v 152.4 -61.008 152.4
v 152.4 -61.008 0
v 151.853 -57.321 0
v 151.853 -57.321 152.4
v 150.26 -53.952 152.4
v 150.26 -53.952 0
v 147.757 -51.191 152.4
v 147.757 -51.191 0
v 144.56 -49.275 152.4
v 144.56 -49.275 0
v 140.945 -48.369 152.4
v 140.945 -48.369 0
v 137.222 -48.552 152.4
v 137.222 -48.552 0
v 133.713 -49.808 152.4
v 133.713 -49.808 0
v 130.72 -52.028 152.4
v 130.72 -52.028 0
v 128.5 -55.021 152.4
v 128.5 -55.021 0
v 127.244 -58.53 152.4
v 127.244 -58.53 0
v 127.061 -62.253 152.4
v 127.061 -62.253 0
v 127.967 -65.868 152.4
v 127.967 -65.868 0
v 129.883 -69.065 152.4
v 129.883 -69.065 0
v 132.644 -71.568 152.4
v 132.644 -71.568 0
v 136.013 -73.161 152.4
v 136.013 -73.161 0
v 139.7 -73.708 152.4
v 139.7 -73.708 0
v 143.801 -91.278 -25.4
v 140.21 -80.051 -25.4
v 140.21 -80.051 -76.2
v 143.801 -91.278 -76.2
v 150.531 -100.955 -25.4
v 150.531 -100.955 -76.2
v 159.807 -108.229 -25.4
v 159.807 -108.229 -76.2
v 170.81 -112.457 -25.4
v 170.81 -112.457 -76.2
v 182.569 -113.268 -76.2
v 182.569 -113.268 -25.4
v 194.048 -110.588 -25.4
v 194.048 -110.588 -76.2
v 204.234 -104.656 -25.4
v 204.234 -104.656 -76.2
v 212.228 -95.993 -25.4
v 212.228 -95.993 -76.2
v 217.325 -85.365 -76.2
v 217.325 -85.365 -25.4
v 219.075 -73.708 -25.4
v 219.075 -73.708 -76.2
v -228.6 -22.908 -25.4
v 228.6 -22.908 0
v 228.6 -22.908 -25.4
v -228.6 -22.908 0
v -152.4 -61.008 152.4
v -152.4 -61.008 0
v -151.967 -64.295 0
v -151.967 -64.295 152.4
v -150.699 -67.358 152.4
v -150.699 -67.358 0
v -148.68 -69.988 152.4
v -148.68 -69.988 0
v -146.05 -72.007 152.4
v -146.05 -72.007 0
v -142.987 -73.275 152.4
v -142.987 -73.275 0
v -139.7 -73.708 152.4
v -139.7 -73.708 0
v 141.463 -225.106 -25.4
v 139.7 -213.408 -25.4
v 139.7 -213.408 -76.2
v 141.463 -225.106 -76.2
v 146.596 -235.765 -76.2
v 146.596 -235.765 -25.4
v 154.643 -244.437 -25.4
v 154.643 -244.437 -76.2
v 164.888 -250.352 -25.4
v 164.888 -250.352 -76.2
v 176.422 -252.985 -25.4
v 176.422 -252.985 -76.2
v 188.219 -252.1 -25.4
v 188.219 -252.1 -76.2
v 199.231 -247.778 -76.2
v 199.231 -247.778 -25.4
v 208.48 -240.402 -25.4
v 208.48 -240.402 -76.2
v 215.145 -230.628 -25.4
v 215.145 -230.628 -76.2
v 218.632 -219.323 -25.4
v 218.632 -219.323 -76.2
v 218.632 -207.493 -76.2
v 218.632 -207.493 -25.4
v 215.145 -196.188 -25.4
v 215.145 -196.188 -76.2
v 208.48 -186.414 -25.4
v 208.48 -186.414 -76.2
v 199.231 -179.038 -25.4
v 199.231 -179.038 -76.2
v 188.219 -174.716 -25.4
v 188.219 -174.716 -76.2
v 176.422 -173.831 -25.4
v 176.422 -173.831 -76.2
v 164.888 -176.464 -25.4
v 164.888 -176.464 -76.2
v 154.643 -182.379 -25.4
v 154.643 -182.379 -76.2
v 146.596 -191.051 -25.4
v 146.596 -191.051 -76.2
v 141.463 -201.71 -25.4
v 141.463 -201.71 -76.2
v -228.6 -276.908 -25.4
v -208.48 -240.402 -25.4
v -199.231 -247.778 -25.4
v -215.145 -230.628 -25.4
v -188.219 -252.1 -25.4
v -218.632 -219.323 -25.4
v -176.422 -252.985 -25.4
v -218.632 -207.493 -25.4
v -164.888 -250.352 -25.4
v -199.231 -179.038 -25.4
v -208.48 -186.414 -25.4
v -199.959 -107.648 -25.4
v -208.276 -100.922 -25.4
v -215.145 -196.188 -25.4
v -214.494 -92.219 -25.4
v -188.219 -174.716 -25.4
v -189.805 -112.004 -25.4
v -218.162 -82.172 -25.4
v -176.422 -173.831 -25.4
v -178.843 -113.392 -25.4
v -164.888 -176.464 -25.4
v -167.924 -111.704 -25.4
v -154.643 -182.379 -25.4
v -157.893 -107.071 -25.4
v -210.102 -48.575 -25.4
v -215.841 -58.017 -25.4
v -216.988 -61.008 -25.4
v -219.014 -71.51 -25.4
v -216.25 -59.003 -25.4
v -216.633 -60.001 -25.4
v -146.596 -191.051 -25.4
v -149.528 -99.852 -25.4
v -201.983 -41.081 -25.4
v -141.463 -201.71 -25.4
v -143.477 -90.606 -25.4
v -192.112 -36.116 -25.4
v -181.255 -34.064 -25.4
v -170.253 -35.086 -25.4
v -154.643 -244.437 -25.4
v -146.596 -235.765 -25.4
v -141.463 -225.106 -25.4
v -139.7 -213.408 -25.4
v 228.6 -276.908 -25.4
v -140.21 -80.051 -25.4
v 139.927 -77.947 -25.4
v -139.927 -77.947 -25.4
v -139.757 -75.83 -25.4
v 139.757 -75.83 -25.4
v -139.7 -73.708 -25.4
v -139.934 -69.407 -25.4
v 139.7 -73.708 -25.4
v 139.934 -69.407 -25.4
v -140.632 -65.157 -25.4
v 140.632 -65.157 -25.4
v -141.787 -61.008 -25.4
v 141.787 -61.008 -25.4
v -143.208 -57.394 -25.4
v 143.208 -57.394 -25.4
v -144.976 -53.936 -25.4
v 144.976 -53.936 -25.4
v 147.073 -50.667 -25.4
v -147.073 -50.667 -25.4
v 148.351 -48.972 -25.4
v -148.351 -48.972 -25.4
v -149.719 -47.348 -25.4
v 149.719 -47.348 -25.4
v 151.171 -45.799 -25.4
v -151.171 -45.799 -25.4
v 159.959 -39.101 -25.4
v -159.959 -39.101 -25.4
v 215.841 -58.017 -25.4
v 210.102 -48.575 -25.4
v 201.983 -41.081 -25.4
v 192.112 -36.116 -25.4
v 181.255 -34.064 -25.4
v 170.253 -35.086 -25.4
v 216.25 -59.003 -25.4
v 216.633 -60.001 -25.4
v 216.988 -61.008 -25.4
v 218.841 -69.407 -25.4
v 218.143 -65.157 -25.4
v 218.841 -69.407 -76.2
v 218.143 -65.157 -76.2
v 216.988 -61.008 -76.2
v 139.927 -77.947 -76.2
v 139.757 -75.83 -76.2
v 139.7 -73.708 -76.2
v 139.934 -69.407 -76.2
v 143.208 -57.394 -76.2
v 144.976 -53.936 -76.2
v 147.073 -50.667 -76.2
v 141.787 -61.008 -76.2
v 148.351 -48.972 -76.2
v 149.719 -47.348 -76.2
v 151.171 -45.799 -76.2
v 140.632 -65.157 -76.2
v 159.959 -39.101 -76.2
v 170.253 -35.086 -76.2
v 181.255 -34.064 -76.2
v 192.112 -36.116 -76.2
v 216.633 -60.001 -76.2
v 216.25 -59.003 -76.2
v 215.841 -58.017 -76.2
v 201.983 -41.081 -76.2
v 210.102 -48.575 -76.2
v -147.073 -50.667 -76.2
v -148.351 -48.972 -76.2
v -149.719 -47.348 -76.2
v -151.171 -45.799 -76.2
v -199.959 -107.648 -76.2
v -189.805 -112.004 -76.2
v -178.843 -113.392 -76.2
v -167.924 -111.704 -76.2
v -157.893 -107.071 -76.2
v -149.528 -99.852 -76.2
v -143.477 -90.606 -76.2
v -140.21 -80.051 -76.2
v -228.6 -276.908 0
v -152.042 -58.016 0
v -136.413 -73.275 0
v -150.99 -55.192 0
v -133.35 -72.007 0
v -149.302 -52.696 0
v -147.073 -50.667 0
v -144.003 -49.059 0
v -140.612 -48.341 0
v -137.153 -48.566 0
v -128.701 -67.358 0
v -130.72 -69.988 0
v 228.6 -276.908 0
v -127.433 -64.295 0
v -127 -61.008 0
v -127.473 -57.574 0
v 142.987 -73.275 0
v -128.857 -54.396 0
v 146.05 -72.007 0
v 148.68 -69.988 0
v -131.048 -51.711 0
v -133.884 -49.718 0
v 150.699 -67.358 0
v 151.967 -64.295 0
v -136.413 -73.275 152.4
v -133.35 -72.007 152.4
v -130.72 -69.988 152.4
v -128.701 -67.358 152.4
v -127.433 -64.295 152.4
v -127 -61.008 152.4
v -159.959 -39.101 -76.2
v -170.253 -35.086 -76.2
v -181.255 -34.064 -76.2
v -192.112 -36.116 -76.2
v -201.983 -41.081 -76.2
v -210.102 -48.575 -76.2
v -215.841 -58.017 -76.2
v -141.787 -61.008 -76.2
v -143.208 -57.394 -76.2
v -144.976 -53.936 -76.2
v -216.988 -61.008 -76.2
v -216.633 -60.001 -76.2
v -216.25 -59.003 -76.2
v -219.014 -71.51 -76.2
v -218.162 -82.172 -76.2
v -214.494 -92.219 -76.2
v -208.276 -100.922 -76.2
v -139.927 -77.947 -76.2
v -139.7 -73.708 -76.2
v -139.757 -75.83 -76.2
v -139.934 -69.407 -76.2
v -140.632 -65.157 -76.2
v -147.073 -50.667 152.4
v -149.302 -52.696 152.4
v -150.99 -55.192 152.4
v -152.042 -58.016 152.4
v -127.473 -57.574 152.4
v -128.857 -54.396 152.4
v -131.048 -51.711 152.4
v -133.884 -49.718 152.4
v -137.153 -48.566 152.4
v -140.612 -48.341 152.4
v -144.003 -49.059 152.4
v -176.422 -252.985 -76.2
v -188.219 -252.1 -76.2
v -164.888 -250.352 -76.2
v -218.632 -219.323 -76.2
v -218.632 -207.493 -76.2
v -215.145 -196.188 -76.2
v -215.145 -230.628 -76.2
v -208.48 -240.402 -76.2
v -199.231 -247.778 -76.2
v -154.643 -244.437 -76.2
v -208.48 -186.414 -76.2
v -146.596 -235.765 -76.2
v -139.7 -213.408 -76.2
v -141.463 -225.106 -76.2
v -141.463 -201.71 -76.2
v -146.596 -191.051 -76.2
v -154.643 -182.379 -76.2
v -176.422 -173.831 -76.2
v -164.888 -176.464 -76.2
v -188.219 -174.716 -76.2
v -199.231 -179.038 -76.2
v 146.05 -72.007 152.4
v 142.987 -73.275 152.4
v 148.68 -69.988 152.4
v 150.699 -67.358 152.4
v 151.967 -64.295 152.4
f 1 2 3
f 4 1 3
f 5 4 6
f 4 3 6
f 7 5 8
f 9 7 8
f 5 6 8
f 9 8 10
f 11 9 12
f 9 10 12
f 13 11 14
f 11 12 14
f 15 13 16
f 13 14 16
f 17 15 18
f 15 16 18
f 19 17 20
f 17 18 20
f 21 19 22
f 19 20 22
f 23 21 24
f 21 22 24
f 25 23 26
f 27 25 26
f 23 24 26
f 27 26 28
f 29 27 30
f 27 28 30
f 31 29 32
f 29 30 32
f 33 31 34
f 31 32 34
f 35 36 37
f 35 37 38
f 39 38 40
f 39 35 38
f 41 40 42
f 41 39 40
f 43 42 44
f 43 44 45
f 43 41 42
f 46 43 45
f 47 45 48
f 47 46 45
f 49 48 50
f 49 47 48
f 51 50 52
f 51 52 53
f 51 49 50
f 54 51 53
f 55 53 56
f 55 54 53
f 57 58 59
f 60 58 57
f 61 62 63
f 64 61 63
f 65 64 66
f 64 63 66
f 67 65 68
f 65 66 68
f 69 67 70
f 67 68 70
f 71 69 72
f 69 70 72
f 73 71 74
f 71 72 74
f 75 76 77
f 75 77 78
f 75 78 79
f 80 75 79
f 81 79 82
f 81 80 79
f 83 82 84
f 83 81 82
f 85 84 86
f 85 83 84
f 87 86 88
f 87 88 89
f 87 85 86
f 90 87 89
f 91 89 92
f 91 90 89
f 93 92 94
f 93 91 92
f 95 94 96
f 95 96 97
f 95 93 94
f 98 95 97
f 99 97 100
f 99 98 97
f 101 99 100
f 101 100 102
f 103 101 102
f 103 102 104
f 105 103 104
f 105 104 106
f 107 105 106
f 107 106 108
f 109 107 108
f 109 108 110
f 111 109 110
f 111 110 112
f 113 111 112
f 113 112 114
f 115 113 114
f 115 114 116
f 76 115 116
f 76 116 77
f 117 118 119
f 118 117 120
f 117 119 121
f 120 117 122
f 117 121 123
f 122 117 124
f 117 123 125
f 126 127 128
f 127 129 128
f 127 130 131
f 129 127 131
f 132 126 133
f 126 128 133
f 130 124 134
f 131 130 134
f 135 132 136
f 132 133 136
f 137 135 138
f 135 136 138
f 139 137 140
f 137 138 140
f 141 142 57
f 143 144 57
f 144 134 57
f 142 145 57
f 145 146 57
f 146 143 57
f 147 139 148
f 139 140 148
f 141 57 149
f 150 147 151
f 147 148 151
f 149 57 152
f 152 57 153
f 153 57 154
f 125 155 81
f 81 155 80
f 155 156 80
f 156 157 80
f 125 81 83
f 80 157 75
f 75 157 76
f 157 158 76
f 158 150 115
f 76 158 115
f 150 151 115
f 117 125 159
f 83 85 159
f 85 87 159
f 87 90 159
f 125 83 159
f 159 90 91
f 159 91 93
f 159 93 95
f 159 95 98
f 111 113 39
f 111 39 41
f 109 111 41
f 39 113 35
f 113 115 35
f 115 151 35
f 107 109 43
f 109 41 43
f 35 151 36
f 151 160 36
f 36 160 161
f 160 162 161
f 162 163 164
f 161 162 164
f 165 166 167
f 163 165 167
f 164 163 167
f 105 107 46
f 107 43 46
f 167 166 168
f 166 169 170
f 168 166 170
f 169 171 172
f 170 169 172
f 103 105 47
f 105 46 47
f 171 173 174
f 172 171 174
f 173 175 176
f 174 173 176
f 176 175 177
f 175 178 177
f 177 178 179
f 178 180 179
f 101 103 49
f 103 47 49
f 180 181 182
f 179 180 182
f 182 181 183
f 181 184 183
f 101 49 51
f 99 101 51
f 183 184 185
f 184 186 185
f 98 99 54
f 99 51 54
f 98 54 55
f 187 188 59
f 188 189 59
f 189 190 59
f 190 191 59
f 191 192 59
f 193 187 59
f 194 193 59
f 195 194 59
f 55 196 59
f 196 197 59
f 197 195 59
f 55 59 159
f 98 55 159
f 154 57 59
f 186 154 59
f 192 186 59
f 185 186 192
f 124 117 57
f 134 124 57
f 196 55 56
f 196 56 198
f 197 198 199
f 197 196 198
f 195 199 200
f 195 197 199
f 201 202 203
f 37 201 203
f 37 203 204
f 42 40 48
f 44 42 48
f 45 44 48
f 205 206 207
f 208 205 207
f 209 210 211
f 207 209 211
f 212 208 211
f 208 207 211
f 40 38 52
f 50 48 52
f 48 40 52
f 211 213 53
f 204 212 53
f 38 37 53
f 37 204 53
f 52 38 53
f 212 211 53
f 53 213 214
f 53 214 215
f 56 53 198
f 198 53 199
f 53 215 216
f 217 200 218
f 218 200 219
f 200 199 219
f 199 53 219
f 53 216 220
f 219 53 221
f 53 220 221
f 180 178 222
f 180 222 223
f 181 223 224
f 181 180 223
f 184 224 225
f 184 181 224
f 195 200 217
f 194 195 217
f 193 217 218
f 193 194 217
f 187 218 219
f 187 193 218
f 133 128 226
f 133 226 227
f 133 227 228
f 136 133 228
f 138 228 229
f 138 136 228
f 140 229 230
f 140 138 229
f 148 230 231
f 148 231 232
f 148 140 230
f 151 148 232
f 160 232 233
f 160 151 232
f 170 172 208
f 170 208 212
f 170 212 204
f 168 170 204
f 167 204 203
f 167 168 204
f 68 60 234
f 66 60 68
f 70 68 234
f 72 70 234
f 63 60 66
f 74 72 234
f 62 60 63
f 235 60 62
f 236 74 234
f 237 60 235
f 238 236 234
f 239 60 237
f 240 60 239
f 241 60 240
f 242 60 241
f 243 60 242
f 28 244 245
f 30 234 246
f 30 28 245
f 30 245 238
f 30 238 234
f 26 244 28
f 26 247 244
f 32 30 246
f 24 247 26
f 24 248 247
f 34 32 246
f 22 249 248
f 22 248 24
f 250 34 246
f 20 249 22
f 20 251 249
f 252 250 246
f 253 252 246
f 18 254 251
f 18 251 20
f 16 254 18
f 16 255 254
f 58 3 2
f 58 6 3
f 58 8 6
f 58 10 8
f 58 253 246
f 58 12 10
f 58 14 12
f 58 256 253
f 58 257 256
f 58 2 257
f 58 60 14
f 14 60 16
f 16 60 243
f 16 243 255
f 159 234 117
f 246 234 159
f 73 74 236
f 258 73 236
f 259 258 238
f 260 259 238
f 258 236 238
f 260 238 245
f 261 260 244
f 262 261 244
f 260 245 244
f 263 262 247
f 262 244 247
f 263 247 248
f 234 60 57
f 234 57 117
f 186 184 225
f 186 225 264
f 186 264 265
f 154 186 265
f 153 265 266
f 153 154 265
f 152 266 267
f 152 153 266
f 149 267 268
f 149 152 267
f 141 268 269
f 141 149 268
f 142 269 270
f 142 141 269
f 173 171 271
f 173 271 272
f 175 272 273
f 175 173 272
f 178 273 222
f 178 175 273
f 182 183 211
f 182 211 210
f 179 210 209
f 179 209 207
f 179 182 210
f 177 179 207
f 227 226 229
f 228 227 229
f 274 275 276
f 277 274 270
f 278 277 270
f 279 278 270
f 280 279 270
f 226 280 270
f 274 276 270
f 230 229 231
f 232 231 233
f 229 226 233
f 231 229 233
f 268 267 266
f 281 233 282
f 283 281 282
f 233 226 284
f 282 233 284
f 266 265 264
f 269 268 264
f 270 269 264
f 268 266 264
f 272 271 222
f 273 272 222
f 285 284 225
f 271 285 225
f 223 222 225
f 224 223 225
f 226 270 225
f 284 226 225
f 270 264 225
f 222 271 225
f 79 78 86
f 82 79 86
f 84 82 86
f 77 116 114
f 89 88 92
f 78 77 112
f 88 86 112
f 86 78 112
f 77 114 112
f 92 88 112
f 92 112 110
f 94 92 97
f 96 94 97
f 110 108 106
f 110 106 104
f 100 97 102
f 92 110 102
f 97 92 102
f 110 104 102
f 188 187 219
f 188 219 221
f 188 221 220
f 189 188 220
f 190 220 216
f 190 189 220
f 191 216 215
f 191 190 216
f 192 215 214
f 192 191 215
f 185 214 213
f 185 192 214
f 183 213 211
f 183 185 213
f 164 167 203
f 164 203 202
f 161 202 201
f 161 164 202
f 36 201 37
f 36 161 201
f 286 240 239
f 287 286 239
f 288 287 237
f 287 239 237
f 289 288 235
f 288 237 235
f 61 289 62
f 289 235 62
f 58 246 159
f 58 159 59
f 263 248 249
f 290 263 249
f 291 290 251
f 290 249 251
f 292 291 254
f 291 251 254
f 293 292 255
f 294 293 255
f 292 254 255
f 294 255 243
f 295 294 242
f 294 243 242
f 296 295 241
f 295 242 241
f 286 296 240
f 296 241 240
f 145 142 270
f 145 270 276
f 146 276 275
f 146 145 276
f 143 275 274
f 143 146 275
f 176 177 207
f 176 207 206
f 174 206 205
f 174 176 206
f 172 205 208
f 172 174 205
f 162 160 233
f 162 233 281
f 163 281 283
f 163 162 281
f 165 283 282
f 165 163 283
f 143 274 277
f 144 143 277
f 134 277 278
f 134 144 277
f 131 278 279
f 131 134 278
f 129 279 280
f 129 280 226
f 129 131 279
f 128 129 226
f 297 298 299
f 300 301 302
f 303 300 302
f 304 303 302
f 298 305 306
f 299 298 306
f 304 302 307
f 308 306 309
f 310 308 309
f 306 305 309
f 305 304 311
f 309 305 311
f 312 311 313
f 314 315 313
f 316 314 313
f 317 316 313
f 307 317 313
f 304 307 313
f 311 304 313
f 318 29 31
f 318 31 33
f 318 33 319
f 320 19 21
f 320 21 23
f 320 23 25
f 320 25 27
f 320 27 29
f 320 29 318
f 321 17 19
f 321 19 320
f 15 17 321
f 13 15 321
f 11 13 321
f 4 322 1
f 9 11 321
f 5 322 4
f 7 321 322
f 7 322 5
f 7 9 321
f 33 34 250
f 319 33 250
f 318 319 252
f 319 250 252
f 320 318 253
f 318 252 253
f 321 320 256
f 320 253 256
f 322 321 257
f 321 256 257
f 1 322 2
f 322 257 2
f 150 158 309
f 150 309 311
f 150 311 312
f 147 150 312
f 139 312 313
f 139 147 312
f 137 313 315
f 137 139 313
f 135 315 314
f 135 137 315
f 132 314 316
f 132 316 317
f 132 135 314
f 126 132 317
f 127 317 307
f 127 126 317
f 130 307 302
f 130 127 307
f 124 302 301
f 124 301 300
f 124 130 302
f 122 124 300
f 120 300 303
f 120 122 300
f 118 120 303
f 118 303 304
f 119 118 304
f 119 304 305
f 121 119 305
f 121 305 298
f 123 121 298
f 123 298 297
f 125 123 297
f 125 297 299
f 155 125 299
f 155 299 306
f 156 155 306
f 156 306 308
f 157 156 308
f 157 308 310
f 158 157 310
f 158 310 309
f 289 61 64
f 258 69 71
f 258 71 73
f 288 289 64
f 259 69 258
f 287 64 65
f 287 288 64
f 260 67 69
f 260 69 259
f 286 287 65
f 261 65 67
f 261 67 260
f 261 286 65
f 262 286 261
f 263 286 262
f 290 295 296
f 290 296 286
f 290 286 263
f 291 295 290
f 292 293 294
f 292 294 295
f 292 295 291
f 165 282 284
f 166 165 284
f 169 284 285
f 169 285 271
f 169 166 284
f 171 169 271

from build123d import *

# Parameters (mm, degrees)
F0_R     = 39.6875
F1_DEPTH = 25.4
F2_DEPTH = 76.2
F3_DEPTH = 152.4


with BuildPart() as f1:
    # F0 (on Top) → F1 (new body)
    with BuildSketch(Plane.XY):
        with BuildLine():
            Line((64.5657867546, -73.7079969396), (0, -73.7079969396))
            Line((0, -73.7079969396), (0, -213.4079969396))
            Line((0, -213.4079969396), (0, -276.9079969396))
            Line((0, -276.9079969396), (228.6, -276.9079969396))
            Line((228.6, -276.9079969396), (228.6, -61.0079969396))
            Line((228.6, -61.0079969396), (216.9881337214, -61.0079969396))
            ThreePointArc((216.9881337214, -61.0079969396), (218.5498084551, -67.2728393878), (219.075, -73.7079969396))
            ThreePointArc((219.075, -73.7079969396), (213.9674206511, -93.1843093218), (199.9593215616, -107.6476170595))
            ThreePointArc((199.9593215616, -107.6476170595), (121.1719117521, -134.9211212537), (64.5657867546, -73.7079969396))
        make_face()
        with BuildLine():
            ThreePointArc((219.075, -213.4079969396), (179.3875, -253.0954969396), (139.7, -213.4079969396))
            ThreePointArc((139.7, -213.4079969396), (179.3875, -173.7204969396), (219.075, -213.4079969396))
        make_face(mode=Mode.SUBTRACT)
        with BuildLine():
            Line((0, -213.4079969396), (0, -73.7079969396))
            Line((0, -73.7079969396), (-64.5657867546, -73.7079969396))
            ThreePointArc((-64.5657867546, -73.7079969396), (-121.1719117521, -134.9211212537), (-199.9593215616, -107.6476170595))
            ThreePointArc((-199.9593215616, -107.6476170595), (-216.6678189317, -87.3195904026), (-216.9881337214, -61.0079969396))
            Line((-216.9881337214, -61.0079969396), (-228.6, -61.0079969396))
            Line((-228.6, -61.0079969396), (-228.6, -276.9079969396))
            Line((-228.6, -276.9079969396), (0, -276.9079969396))
            Line((0, -276.9079969396), (0, -213.4079969396))
        make_face()
        with Locations((-179.3875, -213.4079969396)):
            Circle(F0_R, mode=Mode.SUBTRACT)
        with BuildLine():
            ThreePointArc((219.075, -213.4079969396), (179.3875, -173.7204969396), (139.7, -213.4079969396))
            ThreePointArc((139.7, -213.4079969396), (179.3875, -253.0954969396), (219.075, -213.4079969396))
        make_face()
        with Locations((-179.3875, -213.4079969396)):
            Circle(F0_R)
        with BuildLine():
            ThreePointArc((-199.9593215616, -107.6476170595), (-121.1719117521, -134.9211212537), (-64.5657867546, -73.7079969396))
            Line((-64.5657867546, -73.7079969396), (-125.5009683429, -73.7079969396))
            ThreePointArc((-125.5009683429, -73.7079969396), (-132.1564556102, -78.5007793952), (-140.2101865576, -80.0511639471))
            ThreePointArc((-140.2101865576, -80.0511639471), (-162.7462218601, -109.7380610267), (-199.9593215616, -107.6476170595))
        make_face()
        with BuildLine():
            Line((125.5009683429, -73.7079969396), (64.5657867546, -73.7079969396))
            ThreePointArc((64.5657867546, -73.7079969396), (121.1719117521, -134.9211212537), (199.9593215616, -107.6476170595))
            ThreePointArc((199.9593215616, -107.6476170595), (162.7462218601, -109.7380610267), (140.2101865576, -80.0511639471))
            ThreePointArc((140.2101865576, -80.0511639471), (132.1564556102, -78.5007793952), (125.5009683429, -73.7079969396))
        make_face()
        with BuildLine():
            Line((-158.75, -61.0079969396), (-215.9, -61.0079969396))
            ThreePointArc((-215.9, -61.0079969396), (-211.8047859126, -85.6522629766), (-199.9593215616, -107.6476170595))
            ThreePointArc((-199.9593215616, -107.6476170595), (-162.7462218601, -109.7380610267), (-140.2101865576, -80.0511639471))
            ThreePointArc((-140.2101865576, -80.0511639471), (-147.7093206356, -78.2924779256), (-153.8990316571, -73.7079969396))
            ThreePointArc((-153.8990316571, -73.7079969396), (-157.4959834382, -67.8054577497), (-158.75, -61.0079969396))
        make_face()
        with BuildLine():
            ThreePointArc((199.9593215616, -107.6476170595), (211.8047859126, -85.6522629766), (215.9, -61.0079969396))
            Line((215.9, -61.0079969396), (158.75, -61.0079969396))
            ThreePointArc((158.75, -61.0079969396), (157.4959834382, -67.8054577497), (153.8990316571, -73.7079969396))
            ThreePointArc((153.8990316571, -73.7079969396), (147.7093206356, -78.2924779256), (140.2101865576, -80.0511639471))
            ThreePointArc((140.2101865576, -80.0511639471), (162.7462218601, -109.7380610267), (199.9593215616, -107.6476170595))
        make_face()
        with BuildLine():
            ThreePointArc((-64.2559890942, -50.3009329885), (-67.668281882, -36.1509740894), (-73.7088642316, -22.9079969396))
            Line((-73.7088642316, -22.9079969396), (-205.6911357684, -22.9079969396))
            ThreePointArc((-205.6911357684, -22.9079969396), (-212.902167014, -39.8447565342), (-215.8412589899, -58.0165625961))
            ThreePointArc((-215.8412589899, -58.0165625961), (-186.7550886769, -34.7103522243), (-151.1709455179, -45.7987921962))
            ThreePointArc((-151.1709455179, -45.7987921962), (-144.730628113, -42.6342308371), (-137.5765162555, -42.0767181453))
            Line((-137.5765162555, -42.0767181453), (-64.2559890942, -50.3009329885))
        make_face()
        with BuildLine():
            Line((205.6911357684, -22.9079969396), (73.7088642316, -22.9079969396))
            ThreePointArc((73.7088642316, -22.9079969396), (67.668281882, -36.1509740894), (64.2559890942, -50.3009329885))
            Line((64.2559890942, -50.3009329885), (137.5765161823, -42.0767181535))
            ThreePointArc((137.5765161823, -42.0767181535), (144.7306280775, -42.6342308273), (151.1709455179, -45.7987921962))
            ThreePointArc((151.1709455179, -45.7987921962), (186.7550886769, -34.7103522243), (215.8412589899, -58.0165625961))
            ThreePointArc((215.8412589899, -58.0165625961), (212.902167014, -39.8447565342), (205.6911357684, -22.9079969396))
        make_face()
        with BuildLine():
            Line((0, -22.9079969396), (-73.7088642316, -22.9079969396))
            ThreePointArc((-73.7088642316, -22.9079969396), (-67.668281882, -36.1509740894), (-64.2559890942, -50.3009329885))
            Line((-64.2559890942, -50.3009329885), (0, -57.5083969789))
            Line((0, -57.5083969789), (0, -22.9079969396))
        make_face()
        with BuildLine():
            Line((73.7088642316, -22.9079969396), (0, -22.9079969396))
            Line((0, -22.9079969396), (0, -57.5083969789))
            Line((0, -57.5083969789), (64.2559890942, -50.3009329885))
            ThreePointArc((64.2559890942, -50.3009329885), (67.668281882, -36.1509740894), (73.7088642316, -22.9079969396))
        make_face()
        with BuildLine():
            ThreePointArc((-63.5, -61.0079969396), (-63.6892322397, -55.6411371043), (-64.2559890942, -50.3009329885))
            Line((-64.2559890942, -50.3009329885), (-137.5765162555, -42.0767181453))
            ThreePointArc((-137.5765162555, -42.0767181453), (-125.4986820095, -48.3105536011), (-120.65, -61.0079969396))
            ThreePointArc((-120.65, -61.0079969396), (-121.9040165618, -67.8054577497), (-125.5009683429, -73.7079969396))
            Line((-125.5009683429, -73.7079969396), (-64.5657867546, -73.7079969396))
            ThreePointArc((-64.5657867546, -73.7079969396), (-63.7669141635, -67.3803179729), (-63.5, -61.0079969396))
        make_face()
        with BuildLine():
            Line((137.5765161823, -42.0767181535), (64.2559890942, -50.3009329885))
            ThreePointArc((64.2559890942, -50.3009329885), (63.5066731411, -62.0164324464), (64.5657867546, -73.7079969396))
            Line((64.5657867546, -73.7079969396), (125.5009683429, -73.7079969396))
            ThreePointArc((125.5009683429, -73.7079969396), (121.9027929925, -54.2137403406), (137.5765161823, -42.0767181535))
        make_face()
        with BuildLine():
            ThreePointArc((-151.1709455179, -45.7987921962), (-186.7550886769, -34.7103522243), (-215.8412589899, -58.0165625961))
            ThreePointArc((-215.8412589899, -58.0165625961), (-215.8853133321, -59.5119914301), (-215.9, -61.0079969396))
            Line((-215.9, -61.0079969396), (-158.75, -61.0079969396))
            ThreePointArc((-158.75, -61.0079969396), (-156.7502787677, -52.5114980169), (-151.1709455179, -45.7987921962))
        make_face()
        with BuildLine():
            ThreePointArc((215.9, -61.0079969396), (215.8853133321, -59.5119914301), (215.8412589899, -58.0165625961))
            ThreePointArc((215.8412589899, -58.0165625961), (186.7550886769, -34.7103522243), (151.1709455179, -45.7987921962))
            ThreePointArc((151.1709455179, -45.7987921962), (156.7502787677, -52.5114980169), (158.75, -61.0079969396))
            Line((158.75, -61.0079969396), (215.9, -61.0079969396))
        make_face()
        with BuildLine():
            Line((0, -57.5083969789), (-64.2559890942, -50.3009329885))
            ThreePointArc((-64.2559890942, -50.3009329885), (-63.6892322397, -55.6411371043), (-63.5, -61.0079969396))
            ThreePointArc((-63.5, -61.0079969396), (-63.7669141635, -67.3803179729), (-64.5657867546, -73.7079969396))
            Line((-64.5657867546, -73.7079969396), (0, -73.7079969396))
            Line((0, -73.7079969396), (0, -57.5083969789))
        make_face()
        with BuildLine():
            Line((64.2559890942, -50.3009329885), (0, -57.5083969789))
            Line((0, -57.5083969789), (0, -73.7079969396))
            Line((0, -73.7079969396), (64.5657867546, -73.7079969396))
            ThreePointArc((64.5657867546, -73.7079969396), (63.5066731411, -62.0164324464), (64.2559890942, -50.3009329885))
        make_face()
        with BuildLine():
            ThreePointArc((-215.8412589899, -58.0165625961), (-212.902167014, -39.8447565342), (-205.6911357684, -22.9079969396))
            Line((-205.6911357684, -22.9079969396), (-228.6, -22.9079969396))
            Line((-228.6, -22.9079969396), (-228.6, -61.0079969396))
            Line((-228.6, -61.0079969396), (-216.9881337214, -61.0079969396))
            ThreePointArc((-216.9881337214, -61.0079969396), (-216.4448938617, -59.5007024599), (-215.8412589899, -58.0165625961))
        make_face()
        with BuildLine():
            Line((228.6, -22.9079969396), (205.6911357684, -22.9079969396))
            ThreePointArc((205.6911357684, -22.9079969396), (212.902167014, -39.8447565342), (215.8412589899, -58.0165625961))
            ThreePointArc((215.8412589899, -58.0165625961), (216.4448938617, -59.5007024599), (216.9881337214, -61.0079969396))
            Line((216.9881337214, -61.0079969396), (228.6, -61.0079969396))
            Line((228.6, -61.0079969396), (228.6, -22.9079969396))
        make_face()
        with BuildLine():
            ThreePointArc((-127, -61.0079969396), (-133.8839513111, -49.7180200729), (-147.0730043541, -50.6673583329))
            ThreePointArc((-147.0730043541, -50.6673583329), (-144.0496515891, -55.6432764617), (-141.7868662786, -61.0079969396))
            ThreePointArc((-141.7868662786, -61.0079969396), (-140.2251915449, -67.2728393878), (-139.7, -73.7079969396))
            ThreePointArc((-139.7, -73.7079969396), (-130.7197438789, -69.9882530606), (-127, -61.0079969396))
        make_face()
        with BuildLine():
            ThreePointArc((141.7868662786, -61.0079969396), (144.0496515891, -55.6432764617), (147.0730043541, -50.6673583329))
            ThreePointArc((147.0730043541, -50.6673583329), (127.6042133306, -57.1373452053), (139.7, -73.7079969396))
            ThreePointArc((139.7, -73.7079969396), (140.2251915449, -67.2728393878), (141.7868662786, -61.0079969396))
        make_face()
        with BuildLine():
            ThreePointArc((-120.65, -61.0079969396), (-125.4986820095, -48.3105536011), (-137.5765162555, -42.0767181453))
            ThreePointArc((-137.5765162555, -42.0767181453), (-144.730628113, -42.6342308371), (-151.1709455179, -45.7987921962))
            ThreePointArc((-151.1709455179, -45.7987921962), (-149.0242369761, -48.1508078376), (-147.0730043541, -50.6673583329))
            ThreePointArc((-147.0730043541, -50.6673583329), (-133.8839513111, -49.7180200729), (-127, -61.0079969396))
            ThreePointArc((-127, -61.0079969396), (-130.7197438789, -69.9882530606), (-139.7, -73.7079969396))
            Line((-139.7, -73.7079969396), (-125.5009683429, -73.7079969396))
            ThreePointArc((-125.5009683429, -73.7079969396), (-121.9040165618, -67.8054577497), (-120.65, -61.0079969396))
        make_face()
        with BuildLine():
            ThreePointArc((151.1709455179, -45.7987921962), (144.7306280775, -42.6342308273), (137.5765161823, -42.0767181535))
            ThreePointArc((137.5765161823, -42.0767181535), (121.9027929925, -54.2137403406), (125.5009683429, -73.7079969396))
            Line((125.5009683429, -73.7079969396), (139.7, -73.7079969396))
            ThreePointArc((139.7, -73.7079969396), (127.6042133306, -57.1373452053), (147.0730043541, -50.6673583329))
            ThreePointArc((147.0730043541, -50.6673583329), (149.0242369761, -48.1508078376), (151.1709455179, -45.7987921962))
        make_face()
        with BuildLine():
            ThreePointArc((-199.9593215616, -107.6476170595), (-211.8047859126, -85.6522629766), (-215.9, -61.0079969396))
            Line((-215.9, -61.0079969396), (-216.9881337214, -61.0079969396))
            ThreePointArc((-216.9881337214, -61.0079969396), (-216.6678189317, -87.3195904026), (-199.9593215616, -107.6476170595))
        make_face()
        with BuildLine():
            Line((216.9881337214, -61.0079969396), (215.9, -61.0079969396))
            ThreePointArc((215.9, -61.0079969396), (211.8047859126, -85.6522629766), (199.9593215616, -107.6476170595))
            ThreePointArc((199.9593215616, -107.6476170595), (213.9674206511, -93.1843093218), (219.075, -73.7079969396))
            ThreePointArc((219.075, -73.7079969396), (218.5498084551, -67.2728393878), (216.9881337214, -61.0079969396))
        make_face()
        with BuildLine():
            ThreePointArc((-152.4, -61.0079969396), (-148.6802561211, -69.9882530606), (-139.7, -73.7079969396))
            ThreePointArc((-139.7, -73.7079969396), (-140.2251915449, -67.2728393878), (-141.7868662786, -61.0079969396))
            Line((-141.7868662786, -61.0079969396), (-152.4, -61.0079969396))
        make_face()
        with BuildLine():
            ThreePointArc((141.7868662786, -61.0079969396), (140.2251915449, -67.2728393878), (139.7, -73.7079969396))
            ThreePointArc((139.7, -73.7079969396), (148.6802561211, -69.9882530606), (152.4, -61.0079969396))
            Line((152.4, -61.0079969396), (141.7868662786, -61.0079969396))
        make_face()
        with BuildLine():
            Line((-152.4, -61.0079969396), (-158.75, -61.0079969396))
            ThreePointArc((-158.75, -61.0079969396), (-157.4959834382, -67.8054577497), (-153.8990316571, -73.7079969396))
            Line((-153.8990316571, -73.7079969396), (-139.7, -73.7079969396))
            ThreePointArc((-139.7, -73.7079969396), (-148.6802561211, -69.9882530606), (-152.4, -61.0079969396))
        make_face()
        with BuildLine():
            ThreePointArc((153.8990316571, -73.7079969396), (157.4959834382, -67.8054577497), (158.75, -61.0079969396))
            Line((158.75, -61.0079969396), (152.4, -61.0079969396))
            ThreePointArc((152.4, -61.0079969396), (148.6802561211, -69.9882530606), (139.7, -73.7079969396))
            Line((139.7, -73.7079969396), (153.8990316571, -73.7079969396))
        make_face()
        with BuildLine():
            ThreePointArc((-147.0730043541, -50.6673583329), (-149.0242369761, -48.1508078376), (-151.1709455179, -45.7987921962))
            ThreePointArc((-151.1709455179, -45.7987921962), (-156.7502787677, -52.5114980169), (-158.75, -61.0079969396))
            Line((-158.75, -61.0079969396), (-152.4, -61.0079969396))
            ThreePointArc((-152.4, -61.0079969396), (-150.9899768666, -55.1919482507), (-147.0730043541, -50.6673583329))
        make_face()
        with BuildLine():
            ThreePointArc((158.75, -61.0079969396), (156.7502787677, -52.5114980169), (151.1709455179, -45.7987921962))
            ThreePointArc((151.1709455179, -45.7987921962), (149.0242369761, -48.1508078376), (147.0730043541, -50.6673583329))
            ThreePointArc((147.0730043541, -50.6673583329), (150.9899768666, -55.1919482507), (152.4, -61.0079969396))
            Line((152.4, -61.0079969396), (158.75, -61.0079969396))
        make_face()
        with BuildLine():
            ThreePointArc((-141.7868662786, -61.0079969396), (-144.0496515891, -55.6432764617), (-147.0730043541, -50.6673583329))
            ThreePointArc((-147.0730043541, -50.6673583329), (-150.9899768666, -55.1919482507), (-152.4, -61.0079969396))
            Line((-152.4, -61.0079969396), (-141.7868662786, -61.0079969396))
        make_face()
        with BuildLine():
            ThreePointArc((152.4, -61.0079969396), (150.9899768666, -55.1919482507), (147.0730043541, -50.6673583329))
            ThreePointArc((147.0730043541, -50.6673583329), (144.0496515891, -55.6432764617), (141.7868662786, -61.0079969396))
            Line((141.7868662786, -61.0079969396), (152.4, -61.0079969396))
        make_face()
        with BuildLine():
            ThreePointArc((-140.2101865576, -80.0511639471), (-132.1564556102, -78.5007793952), (-125.5009683429, -73.7079969396))
            Line((-125.5009683429, -73.7079969396), (-139.7, -73.7079969396))
            ThreePointArc((-139.7, -73.7079969396), (-139.8277522537, -76.8898225951), (-140.2101865576, -80.0511639471))
        make_face()
        with BuildLine():
            Line((139.7, -73.7079969396), (125.5009683429, -73.7079969396))
            ThreePointArc((125.5009683429, -73.7079969396), (132.1564556102, -78.5007793952), (140.2101865576, -80.0511639471))
            ThreePointArc((140.2101865576, -80.0511639471), (139.8277522537, -76.8898225951), (139.7, -73.7079969396))
        make_face()
        with BuildLine():
            ThreePointArc((-153.8990316571, -73.7079969396), (-147.7093206356, -78.2924779256), (-140.2101865576, -80.0511639471))
            ThreePointArc((-140.2101865576, -80.0511639471), (-139.8277522537, -76.8898225951), (-139.7, -73.7079969396))
            Line((-139.7, -73.7079969396), (-153.8990316571, -73.7079969396))
        make_face()
        with BuildLine():
            ThreePointArc((139.7, -73.7079969396), (139.8277522537, -76.8898225951), (140.2101865576, -80.0511639471))
            ThreePointArc((140.2101865576, -80.0511639471), (147.7093206356, -78.2924779256), (153.8990316571, -73.7079969396))
            Line((153.8990316571, -73.7079969396), (139.7, -73.7079969396))
        make_face()
        with BuildLine():
            ThreePointArc((-215.9, -61.0079969396), (-215.8853133321, -59.5119914301), (-215.8412589899, -58.0165625961))
            ThreePointArc((-215.8412589899, -58.0165625961), (-216.4448938617, -59.5007024599), (-216.9881337214, -61.0079969396))
            Line((-216.9881337214, -61.0079969396), (-215.9, -61.0079969396))
        make_face()
    extrude(amount=-F1_DEPTH)

    # F0 (on Top) → F2 (join)
    with BuildSketch(Plane.XY):
        with BuildLine():
            ThreePointArc((-151.1709455179, -45.7987921962), (-186.7550886769, -34.7103522243), (-215.8412589899, -58.0165625961))
            ThreePointArc((-215.8412589899, -58.0165625961), (-215.8853133321, -59.5119914301), (-215.9, -61.0079969396))
            Line((-215.9, -61.0079969396), (-158.75, -61.0079969396))
            ThreePointArc((-158.75, -61.0079969396), (-156.7502787677, -52.5114980169), (-151.1709455179, -45.7987921962))
        make_face()
        with BuildLine():
            ThreePointArc((-215.9, -61.0079969396), (-215.8853133321, -59.5119914301), (-215.8412589899, -58.0165625961))
            ThreePointArc((-215.8412589899, -58.0165625961), (-216.4448938617, -59.5007024599), (-216.9881337214, -61.0079969396))
            Line((-216.9881337214, -61.0079969396), (-215.9, -61.0079969396))
        make_face()
        with BuildLine():
            ThreePointArc((219.075, -213.4079969396), (179.3875, -173.7204969396), (139.7, -213.4079969396))
            ThreePointArc((139.7, -213.4079969396), (179.3875, -253.0954969396), (219.075, -213.4079969396))
        make_face()
        with Locations((-179.3875, -213.4079969396)):
            Circle(F0_R)
        with BuildLine():
            ThreePointArc((-147.0730043541, -50.6673583329), (-149.0242369761, -48.1508078376), (-151.1709455179, -45.7987921962))
            ThreePointArc((-151.1709455179, -45.7987921962), (-156.7502787677, -52.5114980169), (-158.75, -61.0079969396))
            Line((-158.75, -61.0079969396), (-152.4, -61.0079969396))
            ThreePointArc((-152.4, -61.0079969396), (-150.9899768666, -55.1919482507), (-147.0730043541, -50.6673583329))
        make_face()
        with BuildLine():
            Line((-158.75, -61.0079969396), (-215.9, -61.0079969396))
            ThreePointArc((-215.9, -61.0079969396), (-211.8047859126, -85.6522629766), (-199.9593215616, -107.6476170595))
            ThreePointArc((-199.9593215616, -107.6476170595), (-162.7462218601, -109.7380610267), (-140.2101865576, -80.0511639471))
            ThreePointArc((-140.2101865576, -80.0511639471), (-147.7093206356, -78.2924779256), (-153.8990316571, -73.7079969396))
            ThreePointArc((-153.8990316571, -73.7079969396), (-157.4959834382, -67.8054577497), (-158.75, -61.0079969396))
        make_face()
        with BuildLine():
            ThreePointArc((-199.9593215616, -107.6476170595), (-211.8047859126, -85.6522629766), (-215.9, -61.0079969396))
            Line((-215.9, -61.0079969396), (-216.9881337214, -61.0079969396))
            ThreePointArc((-216.9881337214, -61.0079969396), (-216.6678189317, -87.3195904026), (-199.9593215616, -107.6476170595))
        make_face()
        with BuildLine():
            ThreePointArc((216.9881337214, -61.0079969396), (216.4448938617, -59.5007024599), (215.8412589899, -58.0165625961))
            ThreePointArc((215.8412589899, -58.0165625961), (215.8853133321, -59.5119914301), (215.9, -61.0079969396))
            Line((215.9, -61.0079969396), (216.9881337214, -61.0079969396))
        make_face()
        with BuildLine():
            ThreePointArc((215.9, -61.0079969396), (215.8853133321, -59.5119914301), (215.8412589899, -58.0165625961))
            ThreePointArc((215.8412589899, -58.0165625961), (186.7550886769, -34.7103522243), (151.1709455179, -45.7987921962))
            ThreePointArc((151.1709455179, -45.7987921962), (156.7502787677, -52.5114980169), (158.75, -61.0079969396))
            Line((158.75, -61.0079969396), (215.9, -61.0079969396))
        make_face()
        with BuildLine():
            Line((-152.4, -61.0079969396), (-158.75, -61.0079969396))
            ThreePointArc((-158.75, -61.0079969396), (-157.4959834382, -67.8054577497), (-153.8990316571, -73.7079969396))
            Line((-153.8990316571, -73.7079969396), (-139.7, -73.7079969396))
            ThreePointArc((-139.7, -73.7079969396), (-148.6802561211, -69.9882530606), (-152.4, -61.0079969396))
        make_face()
        with BuildLine():
            ThreePointArc((-141.7868662786, -61.0079969396), (-144.0496515891, -55.6432764617), (-147.0730043541, -50.6673583329))
            ThreePointArc((-147.0730043541, -50.6673583329), (-150.9899768666, -55.1919482507), (-152.4, -61.0079969396))
            Line((-152.4, -61.0079969396), (-141.7868662786, -61.0079969396))
        make_face()
        with BuildLine():
            Line((216.9881337214, -61.0079969396), (215.9, -61.0079969396))
            ThreePointArc((215.9, -61.0079969396), (211.8047859126, -85.6522629766), (199.9593215616, -107.6476170595))
            ThreePointArc((199.9593215616, -107.6476170595), (213.9674206511, -93.1843093218), (219.075, -73.7079969396))
            ThreePointArc((219.075, -73.7079969396), (218.5498084551, -67.2728393878), (216.9881337214, -61.0079969396))
        make_face()
        with BuildLine():
            ThreePointArc((199.9593215616, -107.6476170595), (211.8047859126, -85.6522629766), (215.9, -61.0079969396))
            Line((215.9, -61.0079969396), (158.75, -61.0079969396))
            ThreePointArc((158.75, -61.0079969396), (157.4959834382, -67.8054577497), (153.8990316571, -73.7079969396))
            ThreePointArc((153.8990316571, -73.7079969396), (147.7093206356, -78.2924779256), (140.2101865576, -80.0511639471))
            ThreePointArc((140.2101865576, -80.0511639471), (162.7462218601, -109.7380610267), (199.9593215616, -107.6476170595))
        make_face()
        with BuildLine():
            ThreePointArc((158.75, -61.0079969396), (156.7502787677, -52.5114980169), (151.1709455179, -45.7987921962))
            ThreePointArc((151.1709455179, -45.7987921962), (149.0242369761, -48.1508078376), (147.0730043541, -50.6673583329))
            ThreePointArc((147.0730043541, -50.6673583329), (150.9899768666, -55.1919482507), (152.4, -61.0079969396))
            Line((152.4, -61.0079969396), (158.75, -61.0079969396))
        make_face()
        with BuildLine():
            ThreePointArc((-153.8990316571, -73.7079969396), (-147.7093206356, -78.2924779256), (-140.2101865576, -80.0511639471))
            ThreePointArc((-140.2101865576, -80.0511639471), (-139.8277522537, -76.8898225951), (-139.7, -73.7079969396))
            Line((-139.7, -73.7079969396), (-153.8990316571, -73.7079969396))
        make_face()
        with BuildLine():
            ThreePointArc((-152.4, -61.0079969396), (-148.6802561211, -69.9882530606), (-139.7, -73.7079969396))
            ThreePointArc((-139.7, -73.7079969396), (-140.2251915449, -67.2728393878), (-141.7868662786, -61.0079969396))
            Line((-141.7868662786, -61.0079969396), (-152.4, -61.0079969396))
        make_face()
        with BuildLine():
            ThreePointArc((153.8990316571, -73.7079969396), (157.4959834382, -67.8054577497), (158.75, -61.0079969396))
            Line((158.75, -61.0079969396), (152.4, -61.0079969396))
            ThreePointArc((152.4, -61.0079969396), (148.6802561211, -69.9882530606), (139.7, -73.7079969396))
            Line((139.7, -73.7079969396), (153.8990316571, -73.7079969396))
        make_face()
        with BuildLine():
            ThreePointArc((152.4, -61.0079969396), (150.9899768666, -55.1919482507), (147.0730043541, -50.6673583329))
            ThreePointArc((147.0730043541, -50.6673583329), (144.0496515891, -55.6432764617), (141.7868662786, -61.0079969396))
            Line((141.7868662786, -61.0079969396), (152.4, -61.0079969396))
        make_face()
        with BuildLine():
            ThreePointArc((139.7, -73.7079969396), (139.8277522537, -76.8898225951), (140.2101865576, -80.0511639471))
            ThreePointArc((140.2101865576, -80.0511639471), (147.7093206356, -78.2924779256), (153.8990316571, -73.7079969396))
            Line((153.8990316571, -73.7079969396), (139.7, -73.7079969396))
        make_face()
        with BuildLine():
            ThreePointArc((141.7868662786, -61.0079969396), (140.2251915449, -67.2728393878), (139.7, -73.7079969396))
            ThreePointArc((139.7, -73.7079969396), (148.6802561211, -69.9882530606), (152.4, -61.0079969396))
            Line((152.4, -61.0079969396), (141.7868662786, -61.0079969396))
        make_face()
    extrude(amount=-F2_DEPTH)

    # F0 (on Top) → F3 (join)
    with BuildSketch(Plane.XY):
        with BuildLine():
            ThreePointArc((-141.7868662786, -61.0079969396), (-144.0496515891, -55.6432764617), (-147.0730043541, -50.6673583329))
            ThreePointArc((-147.0730043541, -50.6673583329), (-150.9899768666, -55.1919482507), (-152.4, -61.0079969396))
            Line((-152.4, -61.0079969396), (-141.7868662786, -61.0079969396))
        make_face()
        with BuildLine():
            ThreePointArc((-152.4, -61.0079969396), (-148.6802561211, -69.9882530606), (-139.7, -73.7079969396))
            ThreePointArc((-139.7, -73.7079969396), (-140.2251915449, -67.2728393878), (-141.7868662786, -61.0079969396))
            Line((-141.7868662786, -61.0079969396), (-152.4, -61.0079969396))
        make_face()
        with BuildLine():
            ThreePointArc((-127, -61.0079969396), (-133.8839513111, -49.7180200729), (-147.0730043541, -50.6673583329))
            ThreePointArc((-147.0730043541, -50.6673583329), (-144.0496515891, -55.6432764617), (-141.7868662786, -61.0079969396))
            ThreePointArc((-141.7868662786, -61.0079969396), (-140.2251915449, -67.2728393878), (-139.7, -73.7079969396))
            ThreePointArc((-139.7, -73.7079969396), (-130.7197438789, -69.9882530606), (-127, -61.0079969396))
        make_face()
        with BuildLine():
            ThreePointArc((152.4, -61.0079969396), (150.9899768666, -55.1919482507), (147.0730043541, -50.6673583329))
            ThreePointArc((147.0730043541, -50.6673583329), (144.0496515891, -55.6432764617), (141.7868662786, -61.0079969396))
            Line((141.7868662786, -61.0079969396), (152.4, -61.0079969396))
        make_face()
        with BuildLine():
            ThreePointArc((141.7868662786, -61.0079969396), (144.0496515891, -55.6432764617), (147.0730043541, -50.6673583329))
            ThreePointArc((147.0730043541, -50.6673583329), (127.6042133306, -57.1373452053), (139.7, -73.7079969396))
            ThreePointArc((139.7, -73.7079969396), (140.2251915449, -67.2728393878), (141.7868662786, -61.0079969396))
        make_face()
        with BuildLine():
            ThreePointArc((141.7868662786, -61.0079969396), (140.2251915449, -67.2728393878), (139.7, -73.7079969396))
            ThreePointArc((139.7, -73.7079969396), (148.6802561211, -69.9882530606), (152.4, -61.0079969396))
            Line((152.4, -61.0079969396), (141.7868662786, -61.0079969396))
        make_face()
    extrude(amount=F3_DEPTH)


solid = f1.part
